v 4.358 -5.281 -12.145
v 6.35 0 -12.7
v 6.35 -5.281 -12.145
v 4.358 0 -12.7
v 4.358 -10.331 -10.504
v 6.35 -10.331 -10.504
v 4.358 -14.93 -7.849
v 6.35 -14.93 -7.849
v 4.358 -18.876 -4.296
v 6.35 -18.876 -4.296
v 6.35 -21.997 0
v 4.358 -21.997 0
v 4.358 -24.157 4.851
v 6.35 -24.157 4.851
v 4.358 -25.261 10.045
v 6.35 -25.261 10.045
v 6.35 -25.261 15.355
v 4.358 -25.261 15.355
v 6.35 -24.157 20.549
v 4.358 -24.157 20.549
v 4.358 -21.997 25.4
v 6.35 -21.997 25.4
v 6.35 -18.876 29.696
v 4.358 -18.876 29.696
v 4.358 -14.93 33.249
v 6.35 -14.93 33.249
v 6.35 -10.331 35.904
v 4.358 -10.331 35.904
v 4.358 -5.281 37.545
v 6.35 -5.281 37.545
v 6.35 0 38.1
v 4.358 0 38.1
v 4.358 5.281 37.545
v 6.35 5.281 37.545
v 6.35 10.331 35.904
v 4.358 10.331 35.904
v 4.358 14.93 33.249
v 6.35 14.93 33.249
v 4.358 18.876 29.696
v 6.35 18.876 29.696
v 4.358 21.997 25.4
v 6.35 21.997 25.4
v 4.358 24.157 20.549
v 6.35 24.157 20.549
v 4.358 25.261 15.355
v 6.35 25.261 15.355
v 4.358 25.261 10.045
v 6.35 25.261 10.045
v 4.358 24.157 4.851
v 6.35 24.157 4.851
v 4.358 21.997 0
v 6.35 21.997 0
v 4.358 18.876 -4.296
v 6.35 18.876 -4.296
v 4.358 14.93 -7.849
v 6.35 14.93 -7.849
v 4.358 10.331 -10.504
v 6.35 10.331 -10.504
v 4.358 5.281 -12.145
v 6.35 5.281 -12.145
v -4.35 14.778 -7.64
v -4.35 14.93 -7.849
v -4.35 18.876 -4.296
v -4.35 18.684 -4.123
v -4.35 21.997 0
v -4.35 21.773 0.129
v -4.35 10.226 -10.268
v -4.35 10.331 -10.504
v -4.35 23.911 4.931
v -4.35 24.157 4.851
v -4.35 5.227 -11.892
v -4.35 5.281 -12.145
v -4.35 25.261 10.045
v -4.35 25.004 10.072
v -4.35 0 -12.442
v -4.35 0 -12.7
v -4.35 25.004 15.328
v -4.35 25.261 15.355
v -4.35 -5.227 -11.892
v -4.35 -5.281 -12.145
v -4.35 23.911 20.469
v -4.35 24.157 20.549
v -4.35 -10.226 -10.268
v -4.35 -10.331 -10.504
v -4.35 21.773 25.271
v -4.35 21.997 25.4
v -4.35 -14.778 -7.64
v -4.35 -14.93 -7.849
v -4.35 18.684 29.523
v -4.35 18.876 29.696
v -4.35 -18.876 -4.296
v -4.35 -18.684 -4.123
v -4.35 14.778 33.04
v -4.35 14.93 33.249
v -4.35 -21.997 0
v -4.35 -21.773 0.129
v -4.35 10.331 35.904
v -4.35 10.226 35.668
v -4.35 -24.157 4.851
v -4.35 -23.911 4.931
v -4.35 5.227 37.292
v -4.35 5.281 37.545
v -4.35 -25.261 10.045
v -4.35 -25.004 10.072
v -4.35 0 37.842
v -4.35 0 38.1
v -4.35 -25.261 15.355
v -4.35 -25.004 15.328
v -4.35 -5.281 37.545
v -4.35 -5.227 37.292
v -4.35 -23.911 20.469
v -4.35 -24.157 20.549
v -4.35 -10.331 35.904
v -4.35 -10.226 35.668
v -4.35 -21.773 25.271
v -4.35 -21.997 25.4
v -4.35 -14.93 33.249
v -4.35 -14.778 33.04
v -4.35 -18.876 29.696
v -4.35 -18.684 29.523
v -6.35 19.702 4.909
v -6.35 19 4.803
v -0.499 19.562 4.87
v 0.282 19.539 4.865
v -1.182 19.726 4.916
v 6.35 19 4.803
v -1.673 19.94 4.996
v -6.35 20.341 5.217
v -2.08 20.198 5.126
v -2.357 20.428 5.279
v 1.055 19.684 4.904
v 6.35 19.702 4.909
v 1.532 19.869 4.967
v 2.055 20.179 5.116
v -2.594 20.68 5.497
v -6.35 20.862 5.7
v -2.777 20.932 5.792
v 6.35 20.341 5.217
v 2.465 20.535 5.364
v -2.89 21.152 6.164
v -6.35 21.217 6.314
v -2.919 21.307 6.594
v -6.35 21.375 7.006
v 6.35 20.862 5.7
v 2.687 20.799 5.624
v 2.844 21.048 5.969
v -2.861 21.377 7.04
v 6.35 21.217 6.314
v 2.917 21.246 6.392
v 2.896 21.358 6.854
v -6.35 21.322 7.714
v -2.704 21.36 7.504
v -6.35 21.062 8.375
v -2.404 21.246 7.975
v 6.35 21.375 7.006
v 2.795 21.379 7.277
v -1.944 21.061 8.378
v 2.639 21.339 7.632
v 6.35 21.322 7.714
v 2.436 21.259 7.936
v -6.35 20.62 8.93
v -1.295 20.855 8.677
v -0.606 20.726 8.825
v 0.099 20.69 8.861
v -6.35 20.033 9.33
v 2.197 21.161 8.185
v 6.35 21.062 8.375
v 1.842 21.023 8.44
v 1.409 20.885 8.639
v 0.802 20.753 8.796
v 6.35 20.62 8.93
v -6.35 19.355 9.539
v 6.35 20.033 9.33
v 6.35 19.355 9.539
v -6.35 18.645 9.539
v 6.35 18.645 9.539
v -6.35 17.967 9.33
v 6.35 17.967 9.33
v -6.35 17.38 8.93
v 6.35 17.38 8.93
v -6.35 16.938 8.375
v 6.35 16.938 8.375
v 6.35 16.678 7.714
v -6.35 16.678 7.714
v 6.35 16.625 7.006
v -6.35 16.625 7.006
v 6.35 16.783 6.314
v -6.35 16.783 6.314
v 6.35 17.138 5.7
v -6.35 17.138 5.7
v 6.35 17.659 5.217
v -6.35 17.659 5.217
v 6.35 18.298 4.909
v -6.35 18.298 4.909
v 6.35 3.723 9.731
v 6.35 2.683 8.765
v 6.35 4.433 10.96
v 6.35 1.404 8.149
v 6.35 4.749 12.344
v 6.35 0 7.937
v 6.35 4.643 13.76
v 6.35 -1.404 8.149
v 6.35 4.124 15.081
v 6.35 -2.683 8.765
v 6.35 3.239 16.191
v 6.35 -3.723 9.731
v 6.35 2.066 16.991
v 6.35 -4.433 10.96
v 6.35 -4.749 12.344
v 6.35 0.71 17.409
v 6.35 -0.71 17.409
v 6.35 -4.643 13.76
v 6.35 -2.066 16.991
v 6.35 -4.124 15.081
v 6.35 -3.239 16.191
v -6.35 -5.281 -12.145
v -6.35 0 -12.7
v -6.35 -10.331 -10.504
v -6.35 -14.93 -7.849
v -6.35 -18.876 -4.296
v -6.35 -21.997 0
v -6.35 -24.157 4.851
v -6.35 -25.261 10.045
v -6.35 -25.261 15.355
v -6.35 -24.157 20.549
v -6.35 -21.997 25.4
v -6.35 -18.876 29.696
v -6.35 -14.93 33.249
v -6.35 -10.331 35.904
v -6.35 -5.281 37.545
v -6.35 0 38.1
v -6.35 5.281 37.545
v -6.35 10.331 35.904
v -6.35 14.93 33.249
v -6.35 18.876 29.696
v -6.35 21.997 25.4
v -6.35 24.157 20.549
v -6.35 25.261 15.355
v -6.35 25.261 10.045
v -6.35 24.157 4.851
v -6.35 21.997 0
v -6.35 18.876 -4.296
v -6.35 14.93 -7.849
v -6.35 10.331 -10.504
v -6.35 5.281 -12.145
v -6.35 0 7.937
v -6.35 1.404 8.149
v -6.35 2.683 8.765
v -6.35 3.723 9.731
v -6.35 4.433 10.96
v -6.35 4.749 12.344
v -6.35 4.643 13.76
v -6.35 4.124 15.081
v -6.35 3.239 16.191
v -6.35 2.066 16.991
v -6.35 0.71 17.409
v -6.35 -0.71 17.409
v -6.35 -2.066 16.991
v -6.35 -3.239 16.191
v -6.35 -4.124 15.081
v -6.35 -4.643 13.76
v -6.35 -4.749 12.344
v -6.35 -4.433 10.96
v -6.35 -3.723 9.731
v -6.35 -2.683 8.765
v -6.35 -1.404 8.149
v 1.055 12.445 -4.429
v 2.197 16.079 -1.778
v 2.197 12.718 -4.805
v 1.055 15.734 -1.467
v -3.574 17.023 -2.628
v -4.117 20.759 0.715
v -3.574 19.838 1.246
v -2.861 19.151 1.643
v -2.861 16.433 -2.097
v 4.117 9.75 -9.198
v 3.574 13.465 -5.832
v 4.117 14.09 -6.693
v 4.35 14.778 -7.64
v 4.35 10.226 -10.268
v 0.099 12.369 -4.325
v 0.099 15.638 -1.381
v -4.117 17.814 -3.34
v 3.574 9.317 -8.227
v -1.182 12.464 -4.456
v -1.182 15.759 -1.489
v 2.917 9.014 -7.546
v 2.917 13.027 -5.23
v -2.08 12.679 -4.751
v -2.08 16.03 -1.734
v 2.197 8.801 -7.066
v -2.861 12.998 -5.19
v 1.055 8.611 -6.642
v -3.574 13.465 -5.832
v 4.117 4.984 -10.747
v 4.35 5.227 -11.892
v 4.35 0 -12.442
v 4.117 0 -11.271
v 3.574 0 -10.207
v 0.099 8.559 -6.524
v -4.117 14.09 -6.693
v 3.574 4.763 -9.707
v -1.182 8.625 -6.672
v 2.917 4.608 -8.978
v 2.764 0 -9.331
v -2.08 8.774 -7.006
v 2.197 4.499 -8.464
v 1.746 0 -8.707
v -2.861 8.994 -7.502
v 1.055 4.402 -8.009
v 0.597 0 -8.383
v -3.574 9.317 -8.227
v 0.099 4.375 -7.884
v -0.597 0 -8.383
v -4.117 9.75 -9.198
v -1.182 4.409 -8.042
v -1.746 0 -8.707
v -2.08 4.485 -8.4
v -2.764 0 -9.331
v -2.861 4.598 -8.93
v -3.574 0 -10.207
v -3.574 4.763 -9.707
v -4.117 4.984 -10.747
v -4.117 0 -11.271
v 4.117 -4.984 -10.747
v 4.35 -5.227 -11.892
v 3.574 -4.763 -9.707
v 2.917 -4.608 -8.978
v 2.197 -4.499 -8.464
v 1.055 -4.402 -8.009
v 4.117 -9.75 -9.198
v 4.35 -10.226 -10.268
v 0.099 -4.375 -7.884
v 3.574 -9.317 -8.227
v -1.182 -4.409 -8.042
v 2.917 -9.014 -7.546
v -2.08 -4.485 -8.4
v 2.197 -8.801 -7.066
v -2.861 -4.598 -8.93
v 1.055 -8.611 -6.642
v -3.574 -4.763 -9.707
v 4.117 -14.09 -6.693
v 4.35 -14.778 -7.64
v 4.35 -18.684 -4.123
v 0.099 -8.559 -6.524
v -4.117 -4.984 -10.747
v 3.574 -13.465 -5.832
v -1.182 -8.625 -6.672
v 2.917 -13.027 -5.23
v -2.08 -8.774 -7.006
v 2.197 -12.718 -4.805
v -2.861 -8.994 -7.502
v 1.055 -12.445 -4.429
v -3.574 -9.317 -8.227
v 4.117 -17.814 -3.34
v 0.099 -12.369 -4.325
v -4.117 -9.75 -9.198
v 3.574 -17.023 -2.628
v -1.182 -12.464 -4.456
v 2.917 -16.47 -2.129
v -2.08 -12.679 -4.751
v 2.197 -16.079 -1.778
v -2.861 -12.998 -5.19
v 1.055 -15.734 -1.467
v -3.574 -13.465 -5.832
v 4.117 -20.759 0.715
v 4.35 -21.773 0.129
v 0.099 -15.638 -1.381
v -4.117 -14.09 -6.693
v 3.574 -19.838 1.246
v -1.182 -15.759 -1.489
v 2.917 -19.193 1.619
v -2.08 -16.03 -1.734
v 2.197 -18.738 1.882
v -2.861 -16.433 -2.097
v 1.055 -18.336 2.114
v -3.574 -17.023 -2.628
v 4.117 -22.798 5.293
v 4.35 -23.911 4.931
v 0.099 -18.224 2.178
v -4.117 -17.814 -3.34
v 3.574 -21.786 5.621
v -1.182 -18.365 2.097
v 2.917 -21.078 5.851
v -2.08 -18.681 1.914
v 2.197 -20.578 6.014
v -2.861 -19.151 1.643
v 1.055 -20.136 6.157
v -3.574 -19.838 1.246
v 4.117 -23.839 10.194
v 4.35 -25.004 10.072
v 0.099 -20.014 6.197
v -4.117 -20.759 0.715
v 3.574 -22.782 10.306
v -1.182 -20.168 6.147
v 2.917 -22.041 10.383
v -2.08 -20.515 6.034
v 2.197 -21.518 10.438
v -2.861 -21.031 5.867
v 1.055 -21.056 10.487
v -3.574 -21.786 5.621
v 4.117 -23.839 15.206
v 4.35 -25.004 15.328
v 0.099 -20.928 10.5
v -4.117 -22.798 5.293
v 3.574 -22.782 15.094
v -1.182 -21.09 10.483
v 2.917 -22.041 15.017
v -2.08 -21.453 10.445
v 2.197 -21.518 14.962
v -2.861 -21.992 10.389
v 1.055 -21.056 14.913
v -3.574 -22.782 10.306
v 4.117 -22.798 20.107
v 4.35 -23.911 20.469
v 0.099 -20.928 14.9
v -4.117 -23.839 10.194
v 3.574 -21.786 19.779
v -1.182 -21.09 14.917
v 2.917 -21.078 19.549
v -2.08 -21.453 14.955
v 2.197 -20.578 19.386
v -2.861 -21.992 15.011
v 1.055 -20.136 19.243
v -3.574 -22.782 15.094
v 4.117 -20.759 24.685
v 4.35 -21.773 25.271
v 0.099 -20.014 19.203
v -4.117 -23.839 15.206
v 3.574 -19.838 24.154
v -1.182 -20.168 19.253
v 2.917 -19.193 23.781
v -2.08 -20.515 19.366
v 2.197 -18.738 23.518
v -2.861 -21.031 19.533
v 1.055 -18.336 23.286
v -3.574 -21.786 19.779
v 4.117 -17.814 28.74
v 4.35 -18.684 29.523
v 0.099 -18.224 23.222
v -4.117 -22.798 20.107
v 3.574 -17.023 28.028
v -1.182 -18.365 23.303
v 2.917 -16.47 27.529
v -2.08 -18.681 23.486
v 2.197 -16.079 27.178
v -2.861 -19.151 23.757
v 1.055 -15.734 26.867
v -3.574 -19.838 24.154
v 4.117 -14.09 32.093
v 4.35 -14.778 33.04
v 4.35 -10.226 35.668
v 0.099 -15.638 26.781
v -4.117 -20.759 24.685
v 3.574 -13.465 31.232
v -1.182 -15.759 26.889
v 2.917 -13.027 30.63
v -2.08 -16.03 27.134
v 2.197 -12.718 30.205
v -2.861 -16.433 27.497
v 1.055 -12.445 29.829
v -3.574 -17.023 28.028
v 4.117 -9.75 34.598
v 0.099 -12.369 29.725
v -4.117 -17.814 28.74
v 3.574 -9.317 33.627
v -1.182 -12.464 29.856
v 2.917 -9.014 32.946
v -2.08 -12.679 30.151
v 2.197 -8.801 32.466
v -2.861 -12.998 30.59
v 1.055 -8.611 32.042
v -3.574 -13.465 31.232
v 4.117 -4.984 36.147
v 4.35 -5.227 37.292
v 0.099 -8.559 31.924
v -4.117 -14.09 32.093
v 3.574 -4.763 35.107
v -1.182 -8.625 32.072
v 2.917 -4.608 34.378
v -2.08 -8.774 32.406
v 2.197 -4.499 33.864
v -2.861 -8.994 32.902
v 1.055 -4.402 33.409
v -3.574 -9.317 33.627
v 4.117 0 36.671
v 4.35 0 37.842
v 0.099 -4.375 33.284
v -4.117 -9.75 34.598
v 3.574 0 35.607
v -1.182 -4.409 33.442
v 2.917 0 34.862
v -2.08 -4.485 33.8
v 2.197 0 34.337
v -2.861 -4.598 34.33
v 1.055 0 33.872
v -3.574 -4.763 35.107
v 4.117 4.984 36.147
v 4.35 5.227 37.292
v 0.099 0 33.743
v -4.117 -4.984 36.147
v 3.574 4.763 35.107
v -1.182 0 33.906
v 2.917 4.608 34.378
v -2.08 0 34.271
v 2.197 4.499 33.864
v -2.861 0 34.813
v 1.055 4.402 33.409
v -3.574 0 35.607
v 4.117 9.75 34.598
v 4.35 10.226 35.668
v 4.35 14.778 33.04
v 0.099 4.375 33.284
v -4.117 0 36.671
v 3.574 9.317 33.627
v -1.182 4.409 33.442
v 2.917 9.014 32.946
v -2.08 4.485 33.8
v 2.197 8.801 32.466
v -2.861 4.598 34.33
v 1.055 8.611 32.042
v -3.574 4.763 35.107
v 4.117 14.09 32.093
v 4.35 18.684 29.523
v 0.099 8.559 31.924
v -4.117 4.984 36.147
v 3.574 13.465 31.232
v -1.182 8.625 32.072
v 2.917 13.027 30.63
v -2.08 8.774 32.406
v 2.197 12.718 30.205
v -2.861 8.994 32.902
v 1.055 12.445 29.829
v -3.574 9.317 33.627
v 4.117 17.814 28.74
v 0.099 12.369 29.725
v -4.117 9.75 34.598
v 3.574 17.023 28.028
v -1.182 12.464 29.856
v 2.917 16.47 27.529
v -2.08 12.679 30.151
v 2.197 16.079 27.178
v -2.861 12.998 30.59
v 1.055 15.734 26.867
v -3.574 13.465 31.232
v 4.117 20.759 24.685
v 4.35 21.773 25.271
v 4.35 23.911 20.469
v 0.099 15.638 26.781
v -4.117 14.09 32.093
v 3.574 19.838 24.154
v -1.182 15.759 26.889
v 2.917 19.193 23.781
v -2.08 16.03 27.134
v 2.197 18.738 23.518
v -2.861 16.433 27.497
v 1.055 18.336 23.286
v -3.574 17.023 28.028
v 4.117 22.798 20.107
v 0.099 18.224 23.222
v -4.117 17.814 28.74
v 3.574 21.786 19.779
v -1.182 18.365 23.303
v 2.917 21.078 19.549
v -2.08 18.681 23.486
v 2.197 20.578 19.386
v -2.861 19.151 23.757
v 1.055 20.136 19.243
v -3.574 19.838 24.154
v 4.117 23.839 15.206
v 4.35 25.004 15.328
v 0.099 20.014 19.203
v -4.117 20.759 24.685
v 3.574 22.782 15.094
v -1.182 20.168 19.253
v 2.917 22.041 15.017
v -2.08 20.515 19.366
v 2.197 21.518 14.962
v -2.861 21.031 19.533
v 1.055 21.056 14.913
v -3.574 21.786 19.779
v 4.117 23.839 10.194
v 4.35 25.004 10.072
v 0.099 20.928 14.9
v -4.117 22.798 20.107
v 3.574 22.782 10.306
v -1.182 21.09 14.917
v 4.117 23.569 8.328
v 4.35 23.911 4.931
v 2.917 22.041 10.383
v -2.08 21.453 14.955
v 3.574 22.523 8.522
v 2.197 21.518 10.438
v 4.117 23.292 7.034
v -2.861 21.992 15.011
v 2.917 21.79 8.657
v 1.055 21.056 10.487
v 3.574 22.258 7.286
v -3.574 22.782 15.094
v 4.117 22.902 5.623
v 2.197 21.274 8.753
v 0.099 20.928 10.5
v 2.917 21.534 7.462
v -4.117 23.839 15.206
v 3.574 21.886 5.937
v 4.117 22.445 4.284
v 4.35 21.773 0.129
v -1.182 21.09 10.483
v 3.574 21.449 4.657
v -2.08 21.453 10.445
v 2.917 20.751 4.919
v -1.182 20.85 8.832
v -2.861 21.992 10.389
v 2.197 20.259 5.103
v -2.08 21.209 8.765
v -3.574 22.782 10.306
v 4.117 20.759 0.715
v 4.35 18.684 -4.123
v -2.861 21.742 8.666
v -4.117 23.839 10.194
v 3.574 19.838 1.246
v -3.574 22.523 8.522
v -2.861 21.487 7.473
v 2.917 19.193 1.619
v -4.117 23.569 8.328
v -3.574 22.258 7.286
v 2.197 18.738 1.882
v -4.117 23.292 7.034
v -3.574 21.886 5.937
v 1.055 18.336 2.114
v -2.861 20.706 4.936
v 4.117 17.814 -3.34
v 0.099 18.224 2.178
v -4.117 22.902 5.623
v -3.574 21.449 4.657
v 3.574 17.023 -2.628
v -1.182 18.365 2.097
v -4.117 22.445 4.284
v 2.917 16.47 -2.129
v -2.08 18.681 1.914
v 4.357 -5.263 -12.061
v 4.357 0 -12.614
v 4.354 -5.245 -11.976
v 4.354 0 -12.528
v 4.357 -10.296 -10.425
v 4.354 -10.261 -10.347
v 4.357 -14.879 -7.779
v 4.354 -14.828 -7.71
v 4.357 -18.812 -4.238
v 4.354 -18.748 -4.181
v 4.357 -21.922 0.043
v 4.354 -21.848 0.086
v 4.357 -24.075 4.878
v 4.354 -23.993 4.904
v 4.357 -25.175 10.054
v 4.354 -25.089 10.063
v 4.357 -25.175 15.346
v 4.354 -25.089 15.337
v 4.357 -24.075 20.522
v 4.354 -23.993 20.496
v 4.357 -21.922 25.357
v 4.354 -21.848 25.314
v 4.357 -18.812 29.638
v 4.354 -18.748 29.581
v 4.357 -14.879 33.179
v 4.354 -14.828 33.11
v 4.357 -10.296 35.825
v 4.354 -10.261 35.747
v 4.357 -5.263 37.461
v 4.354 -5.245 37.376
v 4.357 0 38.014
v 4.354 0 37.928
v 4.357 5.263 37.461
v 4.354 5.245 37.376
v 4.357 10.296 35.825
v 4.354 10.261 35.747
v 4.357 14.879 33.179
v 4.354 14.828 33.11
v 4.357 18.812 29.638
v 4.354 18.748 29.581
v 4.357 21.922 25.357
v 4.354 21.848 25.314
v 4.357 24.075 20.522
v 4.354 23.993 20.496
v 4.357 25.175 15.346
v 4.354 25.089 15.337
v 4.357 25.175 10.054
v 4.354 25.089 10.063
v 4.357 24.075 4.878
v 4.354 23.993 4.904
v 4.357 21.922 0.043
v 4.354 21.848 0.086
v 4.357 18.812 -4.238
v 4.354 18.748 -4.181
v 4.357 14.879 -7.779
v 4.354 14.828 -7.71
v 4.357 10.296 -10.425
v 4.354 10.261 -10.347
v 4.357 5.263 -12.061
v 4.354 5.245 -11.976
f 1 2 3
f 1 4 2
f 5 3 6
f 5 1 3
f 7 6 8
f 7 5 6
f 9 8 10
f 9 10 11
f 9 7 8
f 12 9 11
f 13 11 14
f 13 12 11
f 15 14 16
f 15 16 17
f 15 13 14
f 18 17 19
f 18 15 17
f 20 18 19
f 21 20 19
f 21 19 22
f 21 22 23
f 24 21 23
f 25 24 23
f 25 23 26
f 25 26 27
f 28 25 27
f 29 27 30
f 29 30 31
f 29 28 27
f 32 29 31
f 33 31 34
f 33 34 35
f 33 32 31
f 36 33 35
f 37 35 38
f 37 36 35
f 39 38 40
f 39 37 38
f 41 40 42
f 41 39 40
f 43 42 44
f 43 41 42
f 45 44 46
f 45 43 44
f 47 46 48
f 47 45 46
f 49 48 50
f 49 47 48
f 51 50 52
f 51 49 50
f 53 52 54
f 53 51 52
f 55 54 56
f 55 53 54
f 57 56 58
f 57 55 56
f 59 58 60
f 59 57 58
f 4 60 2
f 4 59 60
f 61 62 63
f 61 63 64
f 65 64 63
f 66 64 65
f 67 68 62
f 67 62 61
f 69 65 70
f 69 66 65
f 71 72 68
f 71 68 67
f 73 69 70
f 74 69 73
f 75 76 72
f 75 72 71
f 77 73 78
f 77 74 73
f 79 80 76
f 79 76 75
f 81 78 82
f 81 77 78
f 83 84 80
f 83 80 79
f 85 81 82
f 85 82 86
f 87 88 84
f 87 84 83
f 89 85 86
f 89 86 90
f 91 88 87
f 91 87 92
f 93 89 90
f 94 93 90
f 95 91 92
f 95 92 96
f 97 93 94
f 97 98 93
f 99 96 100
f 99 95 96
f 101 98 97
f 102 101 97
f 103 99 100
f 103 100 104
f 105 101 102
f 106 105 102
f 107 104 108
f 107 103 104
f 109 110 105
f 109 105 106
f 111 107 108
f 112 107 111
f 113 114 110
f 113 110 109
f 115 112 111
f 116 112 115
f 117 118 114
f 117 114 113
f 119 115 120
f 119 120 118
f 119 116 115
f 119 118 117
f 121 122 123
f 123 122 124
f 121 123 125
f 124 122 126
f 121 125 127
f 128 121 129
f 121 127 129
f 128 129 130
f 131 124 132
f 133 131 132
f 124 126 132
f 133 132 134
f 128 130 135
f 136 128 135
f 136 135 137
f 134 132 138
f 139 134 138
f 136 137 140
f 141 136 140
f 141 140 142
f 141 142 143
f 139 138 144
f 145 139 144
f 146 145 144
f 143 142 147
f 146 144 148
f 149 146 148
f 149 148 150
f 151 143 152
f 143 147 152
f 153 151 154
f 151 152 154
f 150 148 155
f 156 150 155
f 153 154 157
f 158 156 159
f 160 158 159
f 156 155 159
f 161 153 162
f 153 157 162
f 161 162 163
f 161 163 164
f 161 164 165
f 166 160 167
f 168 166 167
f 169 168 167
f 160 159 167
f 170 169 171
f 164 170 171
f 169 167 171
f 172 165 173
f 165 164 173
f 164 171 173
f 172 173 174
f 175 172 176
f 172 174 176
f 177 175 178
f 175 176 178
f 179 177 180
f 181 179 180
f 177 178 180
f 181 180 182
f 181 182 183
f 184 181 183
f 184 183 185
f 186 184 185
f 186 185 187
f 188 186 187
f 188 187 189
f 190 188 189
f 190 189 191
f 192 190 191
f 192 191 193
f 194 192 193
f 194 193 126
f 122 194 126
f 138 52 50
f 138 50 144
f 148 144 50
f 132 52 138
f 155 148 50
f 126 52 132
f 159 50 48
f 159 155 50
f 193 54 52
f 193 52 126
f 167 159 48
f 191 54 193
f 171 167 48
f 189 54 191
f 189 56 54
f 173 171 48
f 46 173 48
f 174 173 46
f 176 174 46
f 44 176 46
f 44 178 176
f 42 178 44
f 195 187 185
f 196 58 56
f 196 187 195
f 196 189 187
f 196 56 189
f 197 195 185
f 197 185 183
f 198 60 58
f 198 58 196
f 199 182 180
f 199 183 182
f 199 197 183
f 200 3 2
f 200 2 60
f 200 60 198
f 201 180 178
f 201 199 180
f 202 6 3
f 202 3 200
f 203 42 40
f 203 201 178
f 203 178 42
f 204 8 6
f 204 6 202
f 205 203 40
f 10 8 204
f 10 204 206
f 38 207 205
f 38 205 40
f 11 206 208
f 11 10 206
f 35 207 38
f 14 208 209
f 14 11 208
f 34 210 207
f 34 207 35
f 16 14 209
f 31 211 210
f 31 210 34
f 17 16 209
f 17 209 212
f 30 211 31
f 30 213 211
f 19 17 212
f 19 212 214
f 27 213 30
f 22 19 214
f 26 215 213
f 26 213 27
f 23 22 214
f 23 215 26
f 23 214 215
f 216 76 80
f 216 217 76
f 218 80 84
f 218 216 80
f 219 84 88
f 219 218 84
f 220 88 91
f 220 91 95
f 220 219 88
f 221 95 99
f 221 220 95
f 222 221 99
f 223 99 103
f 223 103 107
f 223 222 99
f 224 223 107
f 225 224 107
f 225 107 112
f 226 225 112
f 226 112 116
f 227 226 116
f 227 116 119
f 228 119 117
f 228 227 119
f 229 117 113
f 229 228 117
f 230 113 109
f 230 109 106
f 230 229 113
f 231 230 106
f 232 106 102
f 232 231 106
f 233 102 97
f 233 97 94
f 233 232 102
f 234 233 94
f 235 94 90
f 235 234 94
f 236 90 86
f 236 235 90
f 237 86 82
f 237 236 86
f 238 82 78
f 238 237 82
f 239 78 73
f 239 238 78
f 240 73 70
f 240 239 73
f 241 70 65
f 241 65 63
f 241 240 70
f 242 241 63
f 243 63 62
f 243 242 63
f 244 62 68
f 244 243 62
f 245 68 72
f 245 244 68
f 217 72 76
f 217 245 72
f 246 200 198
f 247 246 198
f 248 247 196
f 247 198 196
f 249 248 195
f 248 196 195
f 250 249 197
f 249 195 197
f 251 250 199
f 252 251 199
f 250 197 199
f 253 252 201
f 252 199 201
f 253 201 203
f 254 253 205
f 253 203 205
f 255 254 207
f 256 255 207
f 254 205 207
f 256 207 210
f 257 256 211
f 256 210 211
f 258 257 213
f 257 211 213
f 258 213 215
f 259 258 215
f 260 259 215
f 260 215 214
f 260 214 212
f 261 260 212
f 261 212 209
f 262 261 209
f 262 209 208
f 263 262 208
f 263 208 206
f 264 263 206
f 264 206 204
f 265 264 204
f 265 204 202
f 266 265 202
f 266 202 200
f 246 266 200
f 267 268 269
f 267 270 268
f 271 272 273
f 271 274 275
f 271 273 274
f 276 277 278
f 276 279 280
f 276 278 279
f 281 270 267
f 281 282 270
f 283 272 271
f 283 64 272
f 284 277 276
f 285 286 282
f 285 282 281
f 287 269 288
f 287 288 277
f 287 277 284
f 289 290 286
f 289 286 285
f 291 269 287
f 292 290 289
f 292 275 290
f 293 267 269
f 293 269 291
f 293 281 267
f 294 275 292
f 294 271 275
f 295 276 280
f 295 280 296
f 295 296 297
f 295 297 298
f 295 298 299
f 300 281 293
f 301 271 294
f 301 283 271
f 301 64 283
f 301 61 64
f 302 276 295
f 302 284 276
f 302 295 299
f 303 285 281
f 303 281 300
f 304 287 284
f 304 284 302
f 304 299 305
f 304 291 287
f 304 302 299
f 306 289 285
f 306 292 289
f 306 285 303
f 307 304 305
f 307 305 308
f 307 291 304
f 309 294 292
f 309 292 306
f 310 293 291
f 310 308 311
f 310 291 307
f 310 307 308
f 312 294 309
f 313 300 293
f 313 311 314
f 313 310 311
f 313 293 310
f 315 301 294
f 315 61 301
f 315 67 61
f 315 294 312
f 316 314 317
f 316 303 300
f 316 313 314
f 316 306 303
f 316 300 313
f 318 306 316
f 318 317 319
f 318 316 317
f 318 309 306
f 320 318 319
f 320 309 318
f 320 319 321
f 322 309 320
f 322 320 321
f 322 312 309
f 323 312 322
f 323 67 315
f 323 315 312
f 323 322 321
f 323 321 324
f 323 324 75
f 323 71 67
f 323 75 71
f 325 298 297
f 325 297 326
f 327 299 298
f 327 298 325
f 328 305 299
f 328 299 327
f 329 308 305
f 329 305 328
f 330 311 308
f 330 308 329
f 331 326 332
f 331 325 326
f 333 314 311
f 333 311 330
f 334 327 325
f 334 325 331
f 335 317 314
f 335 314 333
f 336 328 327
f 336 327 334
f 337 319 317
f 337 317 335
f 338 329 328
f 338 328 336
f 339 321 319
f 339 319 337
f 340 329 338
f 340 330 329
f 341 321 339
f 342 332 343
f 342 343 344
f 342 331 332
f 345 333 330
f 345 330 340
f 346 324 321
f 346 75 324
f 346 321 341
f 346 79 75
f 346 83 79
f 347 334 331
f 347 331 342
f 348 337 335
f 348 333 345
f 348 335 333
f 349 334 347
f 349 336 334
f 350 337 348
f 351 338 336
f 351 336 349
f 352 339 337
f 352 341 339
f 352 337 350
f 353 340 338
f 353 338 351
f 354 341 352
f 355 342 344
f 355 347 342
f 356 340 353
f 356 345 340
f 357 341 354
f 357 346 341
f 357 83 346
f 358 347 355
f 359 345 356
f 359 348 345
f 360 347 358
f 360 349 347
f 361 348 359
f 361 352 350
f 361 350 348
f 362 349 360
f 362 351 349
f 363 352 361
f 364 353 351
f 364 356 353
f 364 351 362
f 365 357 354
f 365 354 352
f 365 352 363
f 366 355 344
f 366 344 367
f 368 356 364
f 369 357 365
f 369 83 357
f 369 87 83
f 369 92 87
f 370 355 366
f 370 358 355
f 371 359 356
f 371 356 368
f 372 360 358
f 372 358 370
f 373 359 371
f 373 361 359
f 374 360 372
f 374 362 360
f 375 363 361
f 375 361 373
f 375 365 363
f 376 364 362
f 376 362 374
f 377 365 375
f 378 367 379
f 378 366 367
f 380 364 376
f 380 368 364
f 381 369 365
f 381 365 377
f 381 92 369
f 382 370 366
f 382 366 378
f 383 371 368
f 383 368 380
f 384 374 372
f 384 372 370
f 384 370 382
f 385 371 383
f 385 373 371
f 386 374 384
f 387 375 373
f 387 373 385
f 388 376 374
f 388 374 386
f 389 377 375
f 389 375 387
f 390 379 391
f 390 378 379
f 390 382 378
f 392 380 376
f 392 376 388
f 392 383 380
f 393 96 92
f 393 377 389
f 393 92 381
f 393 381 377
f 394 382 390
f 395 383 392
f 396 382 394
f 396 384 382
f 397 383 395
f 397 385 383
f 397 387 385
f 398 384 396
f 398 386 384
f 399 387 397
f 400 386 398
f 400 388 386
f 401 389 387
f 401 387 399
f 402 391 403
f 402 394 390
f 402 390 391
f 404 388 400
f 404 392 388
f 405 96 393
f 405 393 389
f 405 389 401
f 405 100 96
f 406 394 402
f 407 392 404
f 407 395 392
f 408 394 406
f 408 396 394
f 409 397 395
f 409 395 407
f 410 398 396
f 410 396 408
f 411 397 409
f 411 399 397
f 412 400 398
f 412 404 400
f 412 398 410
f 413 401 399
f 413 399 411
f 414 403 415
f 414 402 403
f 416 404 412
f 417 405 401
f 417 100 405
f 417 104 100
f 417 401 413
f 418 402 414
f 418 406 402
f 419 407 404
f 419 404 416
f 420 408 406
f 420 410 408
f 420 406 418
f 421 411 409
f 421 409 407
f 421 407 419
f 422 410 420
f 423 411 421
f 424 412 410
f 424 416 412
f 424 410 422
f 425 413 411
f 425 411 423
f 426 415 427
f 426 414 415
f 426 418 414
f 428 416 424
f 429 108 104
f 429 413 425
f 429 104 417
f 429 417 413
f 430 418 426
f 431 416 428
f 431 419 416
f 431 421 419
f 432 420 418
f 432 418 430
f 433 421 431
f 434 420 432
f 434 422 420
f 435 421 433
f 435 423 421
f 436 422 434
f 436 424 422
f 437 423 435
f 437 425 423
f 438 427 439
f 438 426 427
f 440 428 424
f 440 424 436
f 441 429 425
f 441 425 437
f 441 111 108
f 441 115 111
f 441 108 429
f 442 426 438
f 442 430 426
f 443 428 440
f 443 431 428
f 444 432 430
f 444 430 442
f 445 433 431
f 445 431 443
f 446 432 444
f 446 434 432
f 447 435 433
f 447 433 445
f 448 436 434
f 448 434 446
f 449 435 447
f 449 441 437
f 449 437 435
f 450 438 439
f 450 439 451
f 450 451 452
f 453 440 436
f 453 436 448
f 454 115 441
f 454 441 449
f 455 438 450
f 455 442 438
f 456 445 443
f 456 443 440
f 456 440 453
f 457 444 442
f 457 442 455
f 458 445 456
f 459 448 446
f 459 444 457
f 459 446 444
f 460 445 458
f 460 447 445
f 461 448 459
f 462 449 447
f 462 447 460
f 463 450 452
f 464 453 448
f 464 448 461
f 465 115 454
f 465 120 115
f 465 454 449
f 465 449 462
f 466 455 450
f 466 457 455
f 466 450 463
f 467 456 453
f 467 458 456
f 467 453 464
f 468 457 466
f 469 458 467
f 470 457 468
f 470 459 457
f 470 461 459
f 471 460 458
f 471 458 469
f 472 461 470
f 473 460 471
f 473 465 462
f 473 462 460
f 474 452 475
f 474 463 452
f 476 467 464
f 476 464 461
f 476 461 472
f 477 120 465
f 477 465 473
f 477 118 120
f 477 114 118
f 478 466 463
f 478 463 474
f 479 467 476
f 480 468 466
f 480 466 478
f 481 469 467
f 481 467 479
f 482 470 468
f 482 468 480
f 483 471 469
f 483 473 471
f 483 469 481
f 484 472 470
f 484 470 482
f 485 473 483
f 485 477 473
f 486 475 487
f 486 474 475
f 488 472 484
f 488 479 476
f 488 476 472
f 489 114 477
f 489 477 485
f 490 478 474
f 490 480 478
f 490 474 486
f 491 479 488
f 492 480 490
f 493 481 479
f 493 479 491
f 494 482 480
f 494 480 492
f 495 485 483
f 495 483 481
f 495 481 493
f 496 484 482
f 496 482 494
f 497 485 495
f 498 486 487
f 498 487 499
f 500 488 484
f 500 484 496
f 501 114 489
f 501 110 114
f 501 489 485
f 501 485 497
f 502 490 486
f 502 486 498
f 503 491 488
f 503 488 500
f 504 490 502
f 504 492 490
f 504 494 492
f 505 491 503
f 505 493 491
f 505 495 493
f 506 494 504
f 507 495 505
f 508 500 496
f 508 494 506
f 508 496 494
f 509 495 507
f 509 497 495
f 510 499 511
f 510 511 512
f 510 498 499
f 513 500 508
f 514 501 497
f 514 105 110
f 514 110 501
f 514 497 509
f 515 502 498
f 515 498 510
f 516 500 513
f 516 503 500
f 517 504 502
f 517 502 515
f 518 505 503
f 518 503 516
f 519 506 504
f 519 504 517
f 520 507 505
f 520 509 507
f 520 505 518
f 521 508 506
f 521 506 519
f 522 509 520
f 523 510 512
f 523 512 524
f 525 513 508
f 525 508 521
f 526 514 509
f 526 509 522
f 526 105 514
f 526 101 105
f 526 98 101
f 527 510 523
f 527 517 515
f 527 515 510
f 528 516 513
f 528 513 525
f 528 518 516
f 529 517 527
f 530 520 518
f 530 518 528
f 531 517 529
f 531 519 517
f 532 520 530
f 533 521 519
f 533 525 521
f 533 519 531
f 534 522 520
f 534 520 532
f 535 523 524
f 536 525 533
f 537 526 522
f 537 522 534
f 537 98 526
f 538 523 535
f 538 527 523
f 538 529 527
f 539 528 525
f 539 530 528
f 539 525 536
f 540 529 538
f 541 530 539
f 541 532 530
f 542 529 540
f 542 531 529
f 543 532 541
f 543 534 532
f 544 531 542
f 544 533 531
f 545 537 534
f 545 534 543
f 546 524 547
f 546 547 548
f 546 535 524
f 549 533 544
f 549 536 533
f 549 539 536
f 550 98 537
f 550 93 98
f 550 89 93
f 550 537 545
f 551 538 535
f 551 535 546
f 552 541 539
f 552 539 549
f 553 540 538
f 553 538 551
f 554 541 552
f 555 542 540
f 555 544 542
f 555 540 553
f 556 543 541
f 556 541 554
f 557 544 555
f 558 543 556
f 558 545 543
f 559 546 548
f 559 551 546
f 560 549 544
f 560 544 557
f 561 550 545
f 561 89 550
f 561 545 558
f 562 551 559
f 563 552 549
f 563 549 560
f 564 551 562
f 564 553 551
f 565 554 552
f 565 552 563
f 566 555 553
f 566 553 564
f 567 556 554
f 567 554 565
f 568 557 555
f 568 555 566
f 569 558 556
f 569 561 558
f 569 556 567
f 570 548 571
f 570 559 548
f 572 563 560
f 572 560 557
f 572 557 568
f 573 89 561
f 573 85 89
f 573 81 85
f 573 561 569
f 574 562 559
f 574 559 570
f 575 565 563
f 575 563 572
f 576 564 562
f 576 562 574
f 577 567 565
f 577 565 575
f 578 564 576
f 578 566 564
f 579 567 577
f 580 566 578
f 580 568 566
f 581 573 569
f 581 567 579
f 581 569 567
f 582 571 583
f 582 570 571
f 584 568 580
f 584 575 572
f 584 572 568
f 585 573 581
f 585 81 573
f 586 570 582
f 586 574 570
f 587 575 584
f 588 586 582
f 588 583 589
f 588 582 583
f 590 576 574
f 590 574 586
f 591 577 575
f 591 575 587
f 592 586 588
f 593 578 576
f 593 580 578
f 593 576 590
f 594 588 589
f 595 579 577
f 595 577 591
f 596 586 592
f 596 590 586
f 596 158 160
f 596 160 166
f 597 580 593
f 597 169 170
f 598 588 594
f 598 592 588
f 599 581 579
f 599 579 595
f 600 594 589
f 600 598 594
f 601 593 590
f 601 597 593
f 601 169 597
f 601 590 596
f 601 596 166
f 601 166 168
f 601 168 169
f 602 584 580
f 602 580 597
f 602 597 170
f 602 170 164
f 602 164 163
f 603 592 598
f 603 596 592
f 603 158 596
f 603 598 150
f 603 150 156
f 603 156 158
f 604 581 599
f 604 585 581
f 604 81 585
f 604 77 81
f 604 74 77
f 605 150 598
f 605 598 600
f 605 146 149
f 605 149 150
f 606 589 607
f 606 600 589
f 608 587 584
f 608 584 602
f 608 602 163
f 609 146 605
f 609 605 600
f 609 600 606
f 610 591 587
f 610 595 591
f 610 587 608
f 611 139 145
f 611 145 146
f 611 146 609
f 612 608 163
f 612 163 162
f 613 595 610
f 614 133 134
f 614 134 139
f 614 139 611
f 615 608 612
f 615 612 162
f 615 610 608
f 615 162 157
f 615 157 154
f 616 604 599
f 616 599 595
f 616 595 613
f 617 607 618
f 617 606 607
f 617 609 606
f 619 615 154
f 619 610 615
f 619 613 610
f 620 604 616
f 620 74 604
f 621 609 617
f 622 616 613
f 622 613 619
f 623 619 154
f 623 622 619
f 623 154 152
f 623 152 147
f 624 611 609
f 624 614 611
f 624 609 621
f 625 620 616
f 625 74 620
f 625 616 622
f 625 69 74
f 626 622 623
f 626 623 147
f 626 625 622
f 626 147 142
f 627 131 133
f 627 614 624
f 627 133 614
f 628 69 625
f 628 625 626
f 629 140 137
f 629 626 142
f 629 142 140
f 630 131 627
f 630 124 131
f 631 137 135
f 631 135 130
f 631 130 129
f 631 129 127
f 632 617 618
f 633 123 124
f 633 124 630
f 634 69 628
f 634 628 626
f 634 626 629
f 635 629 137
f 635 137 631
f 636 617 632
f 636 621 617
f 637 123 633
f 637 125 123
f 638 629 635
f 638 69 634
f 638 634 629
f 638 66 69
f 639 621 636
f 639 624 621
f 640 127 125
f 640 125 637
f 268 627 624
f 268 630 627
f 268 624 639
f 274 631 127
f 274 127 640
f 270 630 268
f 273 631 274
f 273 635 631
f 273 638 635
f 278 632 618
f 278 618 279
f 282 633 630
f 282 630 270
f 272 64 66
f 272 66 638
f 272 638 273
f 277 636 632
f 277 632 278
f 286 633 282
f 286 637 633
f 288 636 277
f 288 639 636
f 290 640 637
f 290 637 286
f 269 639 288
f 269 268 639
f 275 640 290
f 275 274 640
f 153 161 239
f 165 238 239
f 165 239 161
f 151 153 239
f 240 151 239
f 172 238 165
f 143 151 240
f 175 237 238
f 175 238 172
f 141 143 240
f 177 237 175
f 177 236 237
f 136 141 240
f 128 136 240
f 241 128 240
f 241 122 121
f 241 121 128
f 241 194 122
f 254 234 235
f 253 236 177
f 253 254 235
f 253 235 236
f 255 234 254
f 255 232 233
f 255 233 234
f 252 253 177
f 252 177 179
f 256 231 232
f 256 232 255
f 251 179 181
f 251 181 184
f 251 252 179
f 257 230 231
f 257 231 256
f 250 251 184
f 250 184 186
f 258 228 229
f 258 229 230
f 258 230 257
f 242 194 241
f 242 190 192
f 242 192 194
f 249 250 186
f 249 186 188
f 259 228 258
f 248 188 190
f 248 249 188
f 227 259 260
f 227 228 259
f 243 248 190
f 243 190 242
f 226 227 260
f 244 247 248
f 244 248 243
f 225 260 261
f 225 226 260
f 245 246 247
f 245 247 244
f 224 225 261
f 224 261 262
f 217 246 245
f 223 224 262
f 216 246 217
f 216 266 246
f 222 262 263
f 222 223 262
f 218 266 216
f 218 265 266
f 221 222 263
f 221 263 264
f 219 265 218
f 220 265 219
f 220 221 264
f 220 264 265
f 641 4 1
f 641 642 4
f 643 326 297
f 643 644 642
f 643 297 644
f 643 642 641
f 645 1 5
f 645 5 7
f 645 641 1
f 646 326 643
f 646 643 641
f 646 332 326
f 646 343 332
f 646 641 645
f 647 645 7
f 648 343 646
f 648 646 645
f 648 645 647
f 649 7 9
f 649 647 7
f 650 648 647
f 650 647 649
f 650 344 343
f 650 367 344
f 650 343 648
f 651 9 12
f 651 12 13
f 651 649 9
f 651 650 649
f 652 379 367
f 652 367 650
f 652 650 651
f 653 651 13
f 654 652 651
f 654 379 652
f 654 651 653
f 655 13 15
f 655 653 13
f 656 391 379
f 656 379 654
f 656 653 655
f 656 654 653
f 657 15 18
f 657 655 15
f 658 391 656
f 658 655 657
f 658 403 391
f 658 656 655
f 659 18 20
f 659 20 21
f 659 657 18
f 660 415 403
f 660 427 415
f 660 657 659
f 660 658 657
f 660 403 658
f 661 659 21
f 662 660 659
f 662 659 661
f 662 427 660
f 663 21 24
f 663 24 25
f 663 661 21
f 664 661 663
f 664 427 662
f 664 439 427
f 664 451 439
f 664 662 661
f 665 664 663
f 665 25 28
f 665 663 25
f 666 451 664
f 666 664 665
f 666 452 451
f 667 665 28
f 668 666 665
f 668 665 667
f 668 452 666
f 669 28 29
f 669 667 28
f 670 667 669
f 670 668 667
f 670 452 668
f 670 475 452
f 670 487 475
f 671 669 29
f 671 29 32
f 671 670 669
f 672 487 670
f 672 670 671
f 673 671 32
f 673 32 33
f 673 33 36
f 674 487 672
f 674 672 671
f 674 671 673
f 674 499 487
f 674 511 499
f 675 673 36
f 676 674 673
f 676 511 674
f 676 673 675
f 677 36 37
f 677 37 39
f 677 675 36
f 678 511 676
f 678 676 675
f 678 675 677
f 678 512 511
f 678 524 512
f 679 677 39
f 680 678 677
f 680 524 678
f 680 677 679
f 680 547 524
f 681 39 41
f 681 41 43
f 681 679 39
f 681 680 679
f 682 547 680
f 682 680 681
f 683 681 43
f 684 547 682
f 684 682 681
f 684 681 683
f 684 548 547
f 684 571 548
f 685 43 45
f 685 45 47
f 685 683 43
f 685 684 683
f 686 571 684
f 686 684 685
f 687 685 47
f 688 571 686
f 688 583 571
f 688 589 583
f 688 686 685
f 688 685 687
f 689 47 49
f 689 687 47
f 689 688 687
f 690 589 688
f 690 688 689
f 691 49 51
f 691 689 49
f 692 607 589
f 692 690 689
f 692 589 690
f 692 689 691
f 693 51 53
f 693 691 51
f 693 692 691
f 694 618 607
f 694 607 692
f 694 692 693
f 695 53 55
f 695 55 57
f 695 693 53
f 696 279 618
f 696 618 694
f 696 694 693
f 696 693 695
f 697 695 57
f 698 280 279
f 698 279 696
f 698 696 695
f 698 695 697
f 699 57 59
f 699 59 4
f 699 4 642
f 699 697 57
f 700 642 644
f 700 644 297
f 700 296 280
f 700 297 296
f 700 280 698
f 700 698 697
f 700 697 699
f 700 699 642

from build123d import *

# Parameters (mm, degrees)
SKETCH3_R          = 4.7625
CUT_EXTRUDE1_DEPTH = 48.519048812
CUT_EXTRUDE2_REACH = 49.519
SKETCH4_R          = 2.38125


with BuildPart() as part:
    # Sketch2 → Revolve1 (revolve)
    with BuildSketch(Plane(origin=(0, 0, 0), x_dir=(1, 0, 0), z_dir=(0, 1, 0))):
        with BuildLine():
            Line((6.35, -12.7), (6.35, 12.7))
            Line((6.35, 12.7), (4.357673642, 12.7))
            ThreePointArc((4.357673642, 12.7), (0.129304347, 8.344245191), (-4.35, 12.441505181))
            Line((-4.35, 12.441505181), (-4.35, 12.7))
            Line((-4.35, 12.7), (-6.35, 12.7))
            Line((-6.35, 12.7), (-6.35, -12.7))
            Line((-6.35, -12.7), (6.35, -12.7))
        make_face()
    revolve(axis=Axis((6.35, 0, 12.7), (-1, 0, 0)))

    # Sketch3 → Cut-Extrude1 (cut, through all)
    with BuildSketch(Plane(origin=(6.35, 0, 0), x_dir=(0, 0, -1), z_dir=(1, 0, 0))):
        with Locations((-12.7, 0)):
            Circle(SKETCH3_R)
    extrude(amount=-CUT_EXTRUDE1_DEPTH, mode=Mode.SUBTRACT)

    # Sketch4 → Cut-Extrude2 (cut, up to next)
    with BuildSketch(Plane(origin=(6.35, 0, 0), x_dir=(0, 0, -1), z_dir=(1, 0, 0)), mode=Mode.PRIVATE) as cut_extrude2_sk1:
        with Locations((-7.184338108, 19)):
            Circle(SKETCH4_R)
    cut_extrude2_tool1 = extrude(cut_extrude2_sk1.sketch, amount=-CUT_EXTRUDE2_REACH, mode=Mode.PRIVATE) & part.part
    add(cut_extrude2_tool1.solids().sort_by_distance((6.35, 19, 7.184338))[0], mode=Mode.SUBTRACT)


solid = part.part
